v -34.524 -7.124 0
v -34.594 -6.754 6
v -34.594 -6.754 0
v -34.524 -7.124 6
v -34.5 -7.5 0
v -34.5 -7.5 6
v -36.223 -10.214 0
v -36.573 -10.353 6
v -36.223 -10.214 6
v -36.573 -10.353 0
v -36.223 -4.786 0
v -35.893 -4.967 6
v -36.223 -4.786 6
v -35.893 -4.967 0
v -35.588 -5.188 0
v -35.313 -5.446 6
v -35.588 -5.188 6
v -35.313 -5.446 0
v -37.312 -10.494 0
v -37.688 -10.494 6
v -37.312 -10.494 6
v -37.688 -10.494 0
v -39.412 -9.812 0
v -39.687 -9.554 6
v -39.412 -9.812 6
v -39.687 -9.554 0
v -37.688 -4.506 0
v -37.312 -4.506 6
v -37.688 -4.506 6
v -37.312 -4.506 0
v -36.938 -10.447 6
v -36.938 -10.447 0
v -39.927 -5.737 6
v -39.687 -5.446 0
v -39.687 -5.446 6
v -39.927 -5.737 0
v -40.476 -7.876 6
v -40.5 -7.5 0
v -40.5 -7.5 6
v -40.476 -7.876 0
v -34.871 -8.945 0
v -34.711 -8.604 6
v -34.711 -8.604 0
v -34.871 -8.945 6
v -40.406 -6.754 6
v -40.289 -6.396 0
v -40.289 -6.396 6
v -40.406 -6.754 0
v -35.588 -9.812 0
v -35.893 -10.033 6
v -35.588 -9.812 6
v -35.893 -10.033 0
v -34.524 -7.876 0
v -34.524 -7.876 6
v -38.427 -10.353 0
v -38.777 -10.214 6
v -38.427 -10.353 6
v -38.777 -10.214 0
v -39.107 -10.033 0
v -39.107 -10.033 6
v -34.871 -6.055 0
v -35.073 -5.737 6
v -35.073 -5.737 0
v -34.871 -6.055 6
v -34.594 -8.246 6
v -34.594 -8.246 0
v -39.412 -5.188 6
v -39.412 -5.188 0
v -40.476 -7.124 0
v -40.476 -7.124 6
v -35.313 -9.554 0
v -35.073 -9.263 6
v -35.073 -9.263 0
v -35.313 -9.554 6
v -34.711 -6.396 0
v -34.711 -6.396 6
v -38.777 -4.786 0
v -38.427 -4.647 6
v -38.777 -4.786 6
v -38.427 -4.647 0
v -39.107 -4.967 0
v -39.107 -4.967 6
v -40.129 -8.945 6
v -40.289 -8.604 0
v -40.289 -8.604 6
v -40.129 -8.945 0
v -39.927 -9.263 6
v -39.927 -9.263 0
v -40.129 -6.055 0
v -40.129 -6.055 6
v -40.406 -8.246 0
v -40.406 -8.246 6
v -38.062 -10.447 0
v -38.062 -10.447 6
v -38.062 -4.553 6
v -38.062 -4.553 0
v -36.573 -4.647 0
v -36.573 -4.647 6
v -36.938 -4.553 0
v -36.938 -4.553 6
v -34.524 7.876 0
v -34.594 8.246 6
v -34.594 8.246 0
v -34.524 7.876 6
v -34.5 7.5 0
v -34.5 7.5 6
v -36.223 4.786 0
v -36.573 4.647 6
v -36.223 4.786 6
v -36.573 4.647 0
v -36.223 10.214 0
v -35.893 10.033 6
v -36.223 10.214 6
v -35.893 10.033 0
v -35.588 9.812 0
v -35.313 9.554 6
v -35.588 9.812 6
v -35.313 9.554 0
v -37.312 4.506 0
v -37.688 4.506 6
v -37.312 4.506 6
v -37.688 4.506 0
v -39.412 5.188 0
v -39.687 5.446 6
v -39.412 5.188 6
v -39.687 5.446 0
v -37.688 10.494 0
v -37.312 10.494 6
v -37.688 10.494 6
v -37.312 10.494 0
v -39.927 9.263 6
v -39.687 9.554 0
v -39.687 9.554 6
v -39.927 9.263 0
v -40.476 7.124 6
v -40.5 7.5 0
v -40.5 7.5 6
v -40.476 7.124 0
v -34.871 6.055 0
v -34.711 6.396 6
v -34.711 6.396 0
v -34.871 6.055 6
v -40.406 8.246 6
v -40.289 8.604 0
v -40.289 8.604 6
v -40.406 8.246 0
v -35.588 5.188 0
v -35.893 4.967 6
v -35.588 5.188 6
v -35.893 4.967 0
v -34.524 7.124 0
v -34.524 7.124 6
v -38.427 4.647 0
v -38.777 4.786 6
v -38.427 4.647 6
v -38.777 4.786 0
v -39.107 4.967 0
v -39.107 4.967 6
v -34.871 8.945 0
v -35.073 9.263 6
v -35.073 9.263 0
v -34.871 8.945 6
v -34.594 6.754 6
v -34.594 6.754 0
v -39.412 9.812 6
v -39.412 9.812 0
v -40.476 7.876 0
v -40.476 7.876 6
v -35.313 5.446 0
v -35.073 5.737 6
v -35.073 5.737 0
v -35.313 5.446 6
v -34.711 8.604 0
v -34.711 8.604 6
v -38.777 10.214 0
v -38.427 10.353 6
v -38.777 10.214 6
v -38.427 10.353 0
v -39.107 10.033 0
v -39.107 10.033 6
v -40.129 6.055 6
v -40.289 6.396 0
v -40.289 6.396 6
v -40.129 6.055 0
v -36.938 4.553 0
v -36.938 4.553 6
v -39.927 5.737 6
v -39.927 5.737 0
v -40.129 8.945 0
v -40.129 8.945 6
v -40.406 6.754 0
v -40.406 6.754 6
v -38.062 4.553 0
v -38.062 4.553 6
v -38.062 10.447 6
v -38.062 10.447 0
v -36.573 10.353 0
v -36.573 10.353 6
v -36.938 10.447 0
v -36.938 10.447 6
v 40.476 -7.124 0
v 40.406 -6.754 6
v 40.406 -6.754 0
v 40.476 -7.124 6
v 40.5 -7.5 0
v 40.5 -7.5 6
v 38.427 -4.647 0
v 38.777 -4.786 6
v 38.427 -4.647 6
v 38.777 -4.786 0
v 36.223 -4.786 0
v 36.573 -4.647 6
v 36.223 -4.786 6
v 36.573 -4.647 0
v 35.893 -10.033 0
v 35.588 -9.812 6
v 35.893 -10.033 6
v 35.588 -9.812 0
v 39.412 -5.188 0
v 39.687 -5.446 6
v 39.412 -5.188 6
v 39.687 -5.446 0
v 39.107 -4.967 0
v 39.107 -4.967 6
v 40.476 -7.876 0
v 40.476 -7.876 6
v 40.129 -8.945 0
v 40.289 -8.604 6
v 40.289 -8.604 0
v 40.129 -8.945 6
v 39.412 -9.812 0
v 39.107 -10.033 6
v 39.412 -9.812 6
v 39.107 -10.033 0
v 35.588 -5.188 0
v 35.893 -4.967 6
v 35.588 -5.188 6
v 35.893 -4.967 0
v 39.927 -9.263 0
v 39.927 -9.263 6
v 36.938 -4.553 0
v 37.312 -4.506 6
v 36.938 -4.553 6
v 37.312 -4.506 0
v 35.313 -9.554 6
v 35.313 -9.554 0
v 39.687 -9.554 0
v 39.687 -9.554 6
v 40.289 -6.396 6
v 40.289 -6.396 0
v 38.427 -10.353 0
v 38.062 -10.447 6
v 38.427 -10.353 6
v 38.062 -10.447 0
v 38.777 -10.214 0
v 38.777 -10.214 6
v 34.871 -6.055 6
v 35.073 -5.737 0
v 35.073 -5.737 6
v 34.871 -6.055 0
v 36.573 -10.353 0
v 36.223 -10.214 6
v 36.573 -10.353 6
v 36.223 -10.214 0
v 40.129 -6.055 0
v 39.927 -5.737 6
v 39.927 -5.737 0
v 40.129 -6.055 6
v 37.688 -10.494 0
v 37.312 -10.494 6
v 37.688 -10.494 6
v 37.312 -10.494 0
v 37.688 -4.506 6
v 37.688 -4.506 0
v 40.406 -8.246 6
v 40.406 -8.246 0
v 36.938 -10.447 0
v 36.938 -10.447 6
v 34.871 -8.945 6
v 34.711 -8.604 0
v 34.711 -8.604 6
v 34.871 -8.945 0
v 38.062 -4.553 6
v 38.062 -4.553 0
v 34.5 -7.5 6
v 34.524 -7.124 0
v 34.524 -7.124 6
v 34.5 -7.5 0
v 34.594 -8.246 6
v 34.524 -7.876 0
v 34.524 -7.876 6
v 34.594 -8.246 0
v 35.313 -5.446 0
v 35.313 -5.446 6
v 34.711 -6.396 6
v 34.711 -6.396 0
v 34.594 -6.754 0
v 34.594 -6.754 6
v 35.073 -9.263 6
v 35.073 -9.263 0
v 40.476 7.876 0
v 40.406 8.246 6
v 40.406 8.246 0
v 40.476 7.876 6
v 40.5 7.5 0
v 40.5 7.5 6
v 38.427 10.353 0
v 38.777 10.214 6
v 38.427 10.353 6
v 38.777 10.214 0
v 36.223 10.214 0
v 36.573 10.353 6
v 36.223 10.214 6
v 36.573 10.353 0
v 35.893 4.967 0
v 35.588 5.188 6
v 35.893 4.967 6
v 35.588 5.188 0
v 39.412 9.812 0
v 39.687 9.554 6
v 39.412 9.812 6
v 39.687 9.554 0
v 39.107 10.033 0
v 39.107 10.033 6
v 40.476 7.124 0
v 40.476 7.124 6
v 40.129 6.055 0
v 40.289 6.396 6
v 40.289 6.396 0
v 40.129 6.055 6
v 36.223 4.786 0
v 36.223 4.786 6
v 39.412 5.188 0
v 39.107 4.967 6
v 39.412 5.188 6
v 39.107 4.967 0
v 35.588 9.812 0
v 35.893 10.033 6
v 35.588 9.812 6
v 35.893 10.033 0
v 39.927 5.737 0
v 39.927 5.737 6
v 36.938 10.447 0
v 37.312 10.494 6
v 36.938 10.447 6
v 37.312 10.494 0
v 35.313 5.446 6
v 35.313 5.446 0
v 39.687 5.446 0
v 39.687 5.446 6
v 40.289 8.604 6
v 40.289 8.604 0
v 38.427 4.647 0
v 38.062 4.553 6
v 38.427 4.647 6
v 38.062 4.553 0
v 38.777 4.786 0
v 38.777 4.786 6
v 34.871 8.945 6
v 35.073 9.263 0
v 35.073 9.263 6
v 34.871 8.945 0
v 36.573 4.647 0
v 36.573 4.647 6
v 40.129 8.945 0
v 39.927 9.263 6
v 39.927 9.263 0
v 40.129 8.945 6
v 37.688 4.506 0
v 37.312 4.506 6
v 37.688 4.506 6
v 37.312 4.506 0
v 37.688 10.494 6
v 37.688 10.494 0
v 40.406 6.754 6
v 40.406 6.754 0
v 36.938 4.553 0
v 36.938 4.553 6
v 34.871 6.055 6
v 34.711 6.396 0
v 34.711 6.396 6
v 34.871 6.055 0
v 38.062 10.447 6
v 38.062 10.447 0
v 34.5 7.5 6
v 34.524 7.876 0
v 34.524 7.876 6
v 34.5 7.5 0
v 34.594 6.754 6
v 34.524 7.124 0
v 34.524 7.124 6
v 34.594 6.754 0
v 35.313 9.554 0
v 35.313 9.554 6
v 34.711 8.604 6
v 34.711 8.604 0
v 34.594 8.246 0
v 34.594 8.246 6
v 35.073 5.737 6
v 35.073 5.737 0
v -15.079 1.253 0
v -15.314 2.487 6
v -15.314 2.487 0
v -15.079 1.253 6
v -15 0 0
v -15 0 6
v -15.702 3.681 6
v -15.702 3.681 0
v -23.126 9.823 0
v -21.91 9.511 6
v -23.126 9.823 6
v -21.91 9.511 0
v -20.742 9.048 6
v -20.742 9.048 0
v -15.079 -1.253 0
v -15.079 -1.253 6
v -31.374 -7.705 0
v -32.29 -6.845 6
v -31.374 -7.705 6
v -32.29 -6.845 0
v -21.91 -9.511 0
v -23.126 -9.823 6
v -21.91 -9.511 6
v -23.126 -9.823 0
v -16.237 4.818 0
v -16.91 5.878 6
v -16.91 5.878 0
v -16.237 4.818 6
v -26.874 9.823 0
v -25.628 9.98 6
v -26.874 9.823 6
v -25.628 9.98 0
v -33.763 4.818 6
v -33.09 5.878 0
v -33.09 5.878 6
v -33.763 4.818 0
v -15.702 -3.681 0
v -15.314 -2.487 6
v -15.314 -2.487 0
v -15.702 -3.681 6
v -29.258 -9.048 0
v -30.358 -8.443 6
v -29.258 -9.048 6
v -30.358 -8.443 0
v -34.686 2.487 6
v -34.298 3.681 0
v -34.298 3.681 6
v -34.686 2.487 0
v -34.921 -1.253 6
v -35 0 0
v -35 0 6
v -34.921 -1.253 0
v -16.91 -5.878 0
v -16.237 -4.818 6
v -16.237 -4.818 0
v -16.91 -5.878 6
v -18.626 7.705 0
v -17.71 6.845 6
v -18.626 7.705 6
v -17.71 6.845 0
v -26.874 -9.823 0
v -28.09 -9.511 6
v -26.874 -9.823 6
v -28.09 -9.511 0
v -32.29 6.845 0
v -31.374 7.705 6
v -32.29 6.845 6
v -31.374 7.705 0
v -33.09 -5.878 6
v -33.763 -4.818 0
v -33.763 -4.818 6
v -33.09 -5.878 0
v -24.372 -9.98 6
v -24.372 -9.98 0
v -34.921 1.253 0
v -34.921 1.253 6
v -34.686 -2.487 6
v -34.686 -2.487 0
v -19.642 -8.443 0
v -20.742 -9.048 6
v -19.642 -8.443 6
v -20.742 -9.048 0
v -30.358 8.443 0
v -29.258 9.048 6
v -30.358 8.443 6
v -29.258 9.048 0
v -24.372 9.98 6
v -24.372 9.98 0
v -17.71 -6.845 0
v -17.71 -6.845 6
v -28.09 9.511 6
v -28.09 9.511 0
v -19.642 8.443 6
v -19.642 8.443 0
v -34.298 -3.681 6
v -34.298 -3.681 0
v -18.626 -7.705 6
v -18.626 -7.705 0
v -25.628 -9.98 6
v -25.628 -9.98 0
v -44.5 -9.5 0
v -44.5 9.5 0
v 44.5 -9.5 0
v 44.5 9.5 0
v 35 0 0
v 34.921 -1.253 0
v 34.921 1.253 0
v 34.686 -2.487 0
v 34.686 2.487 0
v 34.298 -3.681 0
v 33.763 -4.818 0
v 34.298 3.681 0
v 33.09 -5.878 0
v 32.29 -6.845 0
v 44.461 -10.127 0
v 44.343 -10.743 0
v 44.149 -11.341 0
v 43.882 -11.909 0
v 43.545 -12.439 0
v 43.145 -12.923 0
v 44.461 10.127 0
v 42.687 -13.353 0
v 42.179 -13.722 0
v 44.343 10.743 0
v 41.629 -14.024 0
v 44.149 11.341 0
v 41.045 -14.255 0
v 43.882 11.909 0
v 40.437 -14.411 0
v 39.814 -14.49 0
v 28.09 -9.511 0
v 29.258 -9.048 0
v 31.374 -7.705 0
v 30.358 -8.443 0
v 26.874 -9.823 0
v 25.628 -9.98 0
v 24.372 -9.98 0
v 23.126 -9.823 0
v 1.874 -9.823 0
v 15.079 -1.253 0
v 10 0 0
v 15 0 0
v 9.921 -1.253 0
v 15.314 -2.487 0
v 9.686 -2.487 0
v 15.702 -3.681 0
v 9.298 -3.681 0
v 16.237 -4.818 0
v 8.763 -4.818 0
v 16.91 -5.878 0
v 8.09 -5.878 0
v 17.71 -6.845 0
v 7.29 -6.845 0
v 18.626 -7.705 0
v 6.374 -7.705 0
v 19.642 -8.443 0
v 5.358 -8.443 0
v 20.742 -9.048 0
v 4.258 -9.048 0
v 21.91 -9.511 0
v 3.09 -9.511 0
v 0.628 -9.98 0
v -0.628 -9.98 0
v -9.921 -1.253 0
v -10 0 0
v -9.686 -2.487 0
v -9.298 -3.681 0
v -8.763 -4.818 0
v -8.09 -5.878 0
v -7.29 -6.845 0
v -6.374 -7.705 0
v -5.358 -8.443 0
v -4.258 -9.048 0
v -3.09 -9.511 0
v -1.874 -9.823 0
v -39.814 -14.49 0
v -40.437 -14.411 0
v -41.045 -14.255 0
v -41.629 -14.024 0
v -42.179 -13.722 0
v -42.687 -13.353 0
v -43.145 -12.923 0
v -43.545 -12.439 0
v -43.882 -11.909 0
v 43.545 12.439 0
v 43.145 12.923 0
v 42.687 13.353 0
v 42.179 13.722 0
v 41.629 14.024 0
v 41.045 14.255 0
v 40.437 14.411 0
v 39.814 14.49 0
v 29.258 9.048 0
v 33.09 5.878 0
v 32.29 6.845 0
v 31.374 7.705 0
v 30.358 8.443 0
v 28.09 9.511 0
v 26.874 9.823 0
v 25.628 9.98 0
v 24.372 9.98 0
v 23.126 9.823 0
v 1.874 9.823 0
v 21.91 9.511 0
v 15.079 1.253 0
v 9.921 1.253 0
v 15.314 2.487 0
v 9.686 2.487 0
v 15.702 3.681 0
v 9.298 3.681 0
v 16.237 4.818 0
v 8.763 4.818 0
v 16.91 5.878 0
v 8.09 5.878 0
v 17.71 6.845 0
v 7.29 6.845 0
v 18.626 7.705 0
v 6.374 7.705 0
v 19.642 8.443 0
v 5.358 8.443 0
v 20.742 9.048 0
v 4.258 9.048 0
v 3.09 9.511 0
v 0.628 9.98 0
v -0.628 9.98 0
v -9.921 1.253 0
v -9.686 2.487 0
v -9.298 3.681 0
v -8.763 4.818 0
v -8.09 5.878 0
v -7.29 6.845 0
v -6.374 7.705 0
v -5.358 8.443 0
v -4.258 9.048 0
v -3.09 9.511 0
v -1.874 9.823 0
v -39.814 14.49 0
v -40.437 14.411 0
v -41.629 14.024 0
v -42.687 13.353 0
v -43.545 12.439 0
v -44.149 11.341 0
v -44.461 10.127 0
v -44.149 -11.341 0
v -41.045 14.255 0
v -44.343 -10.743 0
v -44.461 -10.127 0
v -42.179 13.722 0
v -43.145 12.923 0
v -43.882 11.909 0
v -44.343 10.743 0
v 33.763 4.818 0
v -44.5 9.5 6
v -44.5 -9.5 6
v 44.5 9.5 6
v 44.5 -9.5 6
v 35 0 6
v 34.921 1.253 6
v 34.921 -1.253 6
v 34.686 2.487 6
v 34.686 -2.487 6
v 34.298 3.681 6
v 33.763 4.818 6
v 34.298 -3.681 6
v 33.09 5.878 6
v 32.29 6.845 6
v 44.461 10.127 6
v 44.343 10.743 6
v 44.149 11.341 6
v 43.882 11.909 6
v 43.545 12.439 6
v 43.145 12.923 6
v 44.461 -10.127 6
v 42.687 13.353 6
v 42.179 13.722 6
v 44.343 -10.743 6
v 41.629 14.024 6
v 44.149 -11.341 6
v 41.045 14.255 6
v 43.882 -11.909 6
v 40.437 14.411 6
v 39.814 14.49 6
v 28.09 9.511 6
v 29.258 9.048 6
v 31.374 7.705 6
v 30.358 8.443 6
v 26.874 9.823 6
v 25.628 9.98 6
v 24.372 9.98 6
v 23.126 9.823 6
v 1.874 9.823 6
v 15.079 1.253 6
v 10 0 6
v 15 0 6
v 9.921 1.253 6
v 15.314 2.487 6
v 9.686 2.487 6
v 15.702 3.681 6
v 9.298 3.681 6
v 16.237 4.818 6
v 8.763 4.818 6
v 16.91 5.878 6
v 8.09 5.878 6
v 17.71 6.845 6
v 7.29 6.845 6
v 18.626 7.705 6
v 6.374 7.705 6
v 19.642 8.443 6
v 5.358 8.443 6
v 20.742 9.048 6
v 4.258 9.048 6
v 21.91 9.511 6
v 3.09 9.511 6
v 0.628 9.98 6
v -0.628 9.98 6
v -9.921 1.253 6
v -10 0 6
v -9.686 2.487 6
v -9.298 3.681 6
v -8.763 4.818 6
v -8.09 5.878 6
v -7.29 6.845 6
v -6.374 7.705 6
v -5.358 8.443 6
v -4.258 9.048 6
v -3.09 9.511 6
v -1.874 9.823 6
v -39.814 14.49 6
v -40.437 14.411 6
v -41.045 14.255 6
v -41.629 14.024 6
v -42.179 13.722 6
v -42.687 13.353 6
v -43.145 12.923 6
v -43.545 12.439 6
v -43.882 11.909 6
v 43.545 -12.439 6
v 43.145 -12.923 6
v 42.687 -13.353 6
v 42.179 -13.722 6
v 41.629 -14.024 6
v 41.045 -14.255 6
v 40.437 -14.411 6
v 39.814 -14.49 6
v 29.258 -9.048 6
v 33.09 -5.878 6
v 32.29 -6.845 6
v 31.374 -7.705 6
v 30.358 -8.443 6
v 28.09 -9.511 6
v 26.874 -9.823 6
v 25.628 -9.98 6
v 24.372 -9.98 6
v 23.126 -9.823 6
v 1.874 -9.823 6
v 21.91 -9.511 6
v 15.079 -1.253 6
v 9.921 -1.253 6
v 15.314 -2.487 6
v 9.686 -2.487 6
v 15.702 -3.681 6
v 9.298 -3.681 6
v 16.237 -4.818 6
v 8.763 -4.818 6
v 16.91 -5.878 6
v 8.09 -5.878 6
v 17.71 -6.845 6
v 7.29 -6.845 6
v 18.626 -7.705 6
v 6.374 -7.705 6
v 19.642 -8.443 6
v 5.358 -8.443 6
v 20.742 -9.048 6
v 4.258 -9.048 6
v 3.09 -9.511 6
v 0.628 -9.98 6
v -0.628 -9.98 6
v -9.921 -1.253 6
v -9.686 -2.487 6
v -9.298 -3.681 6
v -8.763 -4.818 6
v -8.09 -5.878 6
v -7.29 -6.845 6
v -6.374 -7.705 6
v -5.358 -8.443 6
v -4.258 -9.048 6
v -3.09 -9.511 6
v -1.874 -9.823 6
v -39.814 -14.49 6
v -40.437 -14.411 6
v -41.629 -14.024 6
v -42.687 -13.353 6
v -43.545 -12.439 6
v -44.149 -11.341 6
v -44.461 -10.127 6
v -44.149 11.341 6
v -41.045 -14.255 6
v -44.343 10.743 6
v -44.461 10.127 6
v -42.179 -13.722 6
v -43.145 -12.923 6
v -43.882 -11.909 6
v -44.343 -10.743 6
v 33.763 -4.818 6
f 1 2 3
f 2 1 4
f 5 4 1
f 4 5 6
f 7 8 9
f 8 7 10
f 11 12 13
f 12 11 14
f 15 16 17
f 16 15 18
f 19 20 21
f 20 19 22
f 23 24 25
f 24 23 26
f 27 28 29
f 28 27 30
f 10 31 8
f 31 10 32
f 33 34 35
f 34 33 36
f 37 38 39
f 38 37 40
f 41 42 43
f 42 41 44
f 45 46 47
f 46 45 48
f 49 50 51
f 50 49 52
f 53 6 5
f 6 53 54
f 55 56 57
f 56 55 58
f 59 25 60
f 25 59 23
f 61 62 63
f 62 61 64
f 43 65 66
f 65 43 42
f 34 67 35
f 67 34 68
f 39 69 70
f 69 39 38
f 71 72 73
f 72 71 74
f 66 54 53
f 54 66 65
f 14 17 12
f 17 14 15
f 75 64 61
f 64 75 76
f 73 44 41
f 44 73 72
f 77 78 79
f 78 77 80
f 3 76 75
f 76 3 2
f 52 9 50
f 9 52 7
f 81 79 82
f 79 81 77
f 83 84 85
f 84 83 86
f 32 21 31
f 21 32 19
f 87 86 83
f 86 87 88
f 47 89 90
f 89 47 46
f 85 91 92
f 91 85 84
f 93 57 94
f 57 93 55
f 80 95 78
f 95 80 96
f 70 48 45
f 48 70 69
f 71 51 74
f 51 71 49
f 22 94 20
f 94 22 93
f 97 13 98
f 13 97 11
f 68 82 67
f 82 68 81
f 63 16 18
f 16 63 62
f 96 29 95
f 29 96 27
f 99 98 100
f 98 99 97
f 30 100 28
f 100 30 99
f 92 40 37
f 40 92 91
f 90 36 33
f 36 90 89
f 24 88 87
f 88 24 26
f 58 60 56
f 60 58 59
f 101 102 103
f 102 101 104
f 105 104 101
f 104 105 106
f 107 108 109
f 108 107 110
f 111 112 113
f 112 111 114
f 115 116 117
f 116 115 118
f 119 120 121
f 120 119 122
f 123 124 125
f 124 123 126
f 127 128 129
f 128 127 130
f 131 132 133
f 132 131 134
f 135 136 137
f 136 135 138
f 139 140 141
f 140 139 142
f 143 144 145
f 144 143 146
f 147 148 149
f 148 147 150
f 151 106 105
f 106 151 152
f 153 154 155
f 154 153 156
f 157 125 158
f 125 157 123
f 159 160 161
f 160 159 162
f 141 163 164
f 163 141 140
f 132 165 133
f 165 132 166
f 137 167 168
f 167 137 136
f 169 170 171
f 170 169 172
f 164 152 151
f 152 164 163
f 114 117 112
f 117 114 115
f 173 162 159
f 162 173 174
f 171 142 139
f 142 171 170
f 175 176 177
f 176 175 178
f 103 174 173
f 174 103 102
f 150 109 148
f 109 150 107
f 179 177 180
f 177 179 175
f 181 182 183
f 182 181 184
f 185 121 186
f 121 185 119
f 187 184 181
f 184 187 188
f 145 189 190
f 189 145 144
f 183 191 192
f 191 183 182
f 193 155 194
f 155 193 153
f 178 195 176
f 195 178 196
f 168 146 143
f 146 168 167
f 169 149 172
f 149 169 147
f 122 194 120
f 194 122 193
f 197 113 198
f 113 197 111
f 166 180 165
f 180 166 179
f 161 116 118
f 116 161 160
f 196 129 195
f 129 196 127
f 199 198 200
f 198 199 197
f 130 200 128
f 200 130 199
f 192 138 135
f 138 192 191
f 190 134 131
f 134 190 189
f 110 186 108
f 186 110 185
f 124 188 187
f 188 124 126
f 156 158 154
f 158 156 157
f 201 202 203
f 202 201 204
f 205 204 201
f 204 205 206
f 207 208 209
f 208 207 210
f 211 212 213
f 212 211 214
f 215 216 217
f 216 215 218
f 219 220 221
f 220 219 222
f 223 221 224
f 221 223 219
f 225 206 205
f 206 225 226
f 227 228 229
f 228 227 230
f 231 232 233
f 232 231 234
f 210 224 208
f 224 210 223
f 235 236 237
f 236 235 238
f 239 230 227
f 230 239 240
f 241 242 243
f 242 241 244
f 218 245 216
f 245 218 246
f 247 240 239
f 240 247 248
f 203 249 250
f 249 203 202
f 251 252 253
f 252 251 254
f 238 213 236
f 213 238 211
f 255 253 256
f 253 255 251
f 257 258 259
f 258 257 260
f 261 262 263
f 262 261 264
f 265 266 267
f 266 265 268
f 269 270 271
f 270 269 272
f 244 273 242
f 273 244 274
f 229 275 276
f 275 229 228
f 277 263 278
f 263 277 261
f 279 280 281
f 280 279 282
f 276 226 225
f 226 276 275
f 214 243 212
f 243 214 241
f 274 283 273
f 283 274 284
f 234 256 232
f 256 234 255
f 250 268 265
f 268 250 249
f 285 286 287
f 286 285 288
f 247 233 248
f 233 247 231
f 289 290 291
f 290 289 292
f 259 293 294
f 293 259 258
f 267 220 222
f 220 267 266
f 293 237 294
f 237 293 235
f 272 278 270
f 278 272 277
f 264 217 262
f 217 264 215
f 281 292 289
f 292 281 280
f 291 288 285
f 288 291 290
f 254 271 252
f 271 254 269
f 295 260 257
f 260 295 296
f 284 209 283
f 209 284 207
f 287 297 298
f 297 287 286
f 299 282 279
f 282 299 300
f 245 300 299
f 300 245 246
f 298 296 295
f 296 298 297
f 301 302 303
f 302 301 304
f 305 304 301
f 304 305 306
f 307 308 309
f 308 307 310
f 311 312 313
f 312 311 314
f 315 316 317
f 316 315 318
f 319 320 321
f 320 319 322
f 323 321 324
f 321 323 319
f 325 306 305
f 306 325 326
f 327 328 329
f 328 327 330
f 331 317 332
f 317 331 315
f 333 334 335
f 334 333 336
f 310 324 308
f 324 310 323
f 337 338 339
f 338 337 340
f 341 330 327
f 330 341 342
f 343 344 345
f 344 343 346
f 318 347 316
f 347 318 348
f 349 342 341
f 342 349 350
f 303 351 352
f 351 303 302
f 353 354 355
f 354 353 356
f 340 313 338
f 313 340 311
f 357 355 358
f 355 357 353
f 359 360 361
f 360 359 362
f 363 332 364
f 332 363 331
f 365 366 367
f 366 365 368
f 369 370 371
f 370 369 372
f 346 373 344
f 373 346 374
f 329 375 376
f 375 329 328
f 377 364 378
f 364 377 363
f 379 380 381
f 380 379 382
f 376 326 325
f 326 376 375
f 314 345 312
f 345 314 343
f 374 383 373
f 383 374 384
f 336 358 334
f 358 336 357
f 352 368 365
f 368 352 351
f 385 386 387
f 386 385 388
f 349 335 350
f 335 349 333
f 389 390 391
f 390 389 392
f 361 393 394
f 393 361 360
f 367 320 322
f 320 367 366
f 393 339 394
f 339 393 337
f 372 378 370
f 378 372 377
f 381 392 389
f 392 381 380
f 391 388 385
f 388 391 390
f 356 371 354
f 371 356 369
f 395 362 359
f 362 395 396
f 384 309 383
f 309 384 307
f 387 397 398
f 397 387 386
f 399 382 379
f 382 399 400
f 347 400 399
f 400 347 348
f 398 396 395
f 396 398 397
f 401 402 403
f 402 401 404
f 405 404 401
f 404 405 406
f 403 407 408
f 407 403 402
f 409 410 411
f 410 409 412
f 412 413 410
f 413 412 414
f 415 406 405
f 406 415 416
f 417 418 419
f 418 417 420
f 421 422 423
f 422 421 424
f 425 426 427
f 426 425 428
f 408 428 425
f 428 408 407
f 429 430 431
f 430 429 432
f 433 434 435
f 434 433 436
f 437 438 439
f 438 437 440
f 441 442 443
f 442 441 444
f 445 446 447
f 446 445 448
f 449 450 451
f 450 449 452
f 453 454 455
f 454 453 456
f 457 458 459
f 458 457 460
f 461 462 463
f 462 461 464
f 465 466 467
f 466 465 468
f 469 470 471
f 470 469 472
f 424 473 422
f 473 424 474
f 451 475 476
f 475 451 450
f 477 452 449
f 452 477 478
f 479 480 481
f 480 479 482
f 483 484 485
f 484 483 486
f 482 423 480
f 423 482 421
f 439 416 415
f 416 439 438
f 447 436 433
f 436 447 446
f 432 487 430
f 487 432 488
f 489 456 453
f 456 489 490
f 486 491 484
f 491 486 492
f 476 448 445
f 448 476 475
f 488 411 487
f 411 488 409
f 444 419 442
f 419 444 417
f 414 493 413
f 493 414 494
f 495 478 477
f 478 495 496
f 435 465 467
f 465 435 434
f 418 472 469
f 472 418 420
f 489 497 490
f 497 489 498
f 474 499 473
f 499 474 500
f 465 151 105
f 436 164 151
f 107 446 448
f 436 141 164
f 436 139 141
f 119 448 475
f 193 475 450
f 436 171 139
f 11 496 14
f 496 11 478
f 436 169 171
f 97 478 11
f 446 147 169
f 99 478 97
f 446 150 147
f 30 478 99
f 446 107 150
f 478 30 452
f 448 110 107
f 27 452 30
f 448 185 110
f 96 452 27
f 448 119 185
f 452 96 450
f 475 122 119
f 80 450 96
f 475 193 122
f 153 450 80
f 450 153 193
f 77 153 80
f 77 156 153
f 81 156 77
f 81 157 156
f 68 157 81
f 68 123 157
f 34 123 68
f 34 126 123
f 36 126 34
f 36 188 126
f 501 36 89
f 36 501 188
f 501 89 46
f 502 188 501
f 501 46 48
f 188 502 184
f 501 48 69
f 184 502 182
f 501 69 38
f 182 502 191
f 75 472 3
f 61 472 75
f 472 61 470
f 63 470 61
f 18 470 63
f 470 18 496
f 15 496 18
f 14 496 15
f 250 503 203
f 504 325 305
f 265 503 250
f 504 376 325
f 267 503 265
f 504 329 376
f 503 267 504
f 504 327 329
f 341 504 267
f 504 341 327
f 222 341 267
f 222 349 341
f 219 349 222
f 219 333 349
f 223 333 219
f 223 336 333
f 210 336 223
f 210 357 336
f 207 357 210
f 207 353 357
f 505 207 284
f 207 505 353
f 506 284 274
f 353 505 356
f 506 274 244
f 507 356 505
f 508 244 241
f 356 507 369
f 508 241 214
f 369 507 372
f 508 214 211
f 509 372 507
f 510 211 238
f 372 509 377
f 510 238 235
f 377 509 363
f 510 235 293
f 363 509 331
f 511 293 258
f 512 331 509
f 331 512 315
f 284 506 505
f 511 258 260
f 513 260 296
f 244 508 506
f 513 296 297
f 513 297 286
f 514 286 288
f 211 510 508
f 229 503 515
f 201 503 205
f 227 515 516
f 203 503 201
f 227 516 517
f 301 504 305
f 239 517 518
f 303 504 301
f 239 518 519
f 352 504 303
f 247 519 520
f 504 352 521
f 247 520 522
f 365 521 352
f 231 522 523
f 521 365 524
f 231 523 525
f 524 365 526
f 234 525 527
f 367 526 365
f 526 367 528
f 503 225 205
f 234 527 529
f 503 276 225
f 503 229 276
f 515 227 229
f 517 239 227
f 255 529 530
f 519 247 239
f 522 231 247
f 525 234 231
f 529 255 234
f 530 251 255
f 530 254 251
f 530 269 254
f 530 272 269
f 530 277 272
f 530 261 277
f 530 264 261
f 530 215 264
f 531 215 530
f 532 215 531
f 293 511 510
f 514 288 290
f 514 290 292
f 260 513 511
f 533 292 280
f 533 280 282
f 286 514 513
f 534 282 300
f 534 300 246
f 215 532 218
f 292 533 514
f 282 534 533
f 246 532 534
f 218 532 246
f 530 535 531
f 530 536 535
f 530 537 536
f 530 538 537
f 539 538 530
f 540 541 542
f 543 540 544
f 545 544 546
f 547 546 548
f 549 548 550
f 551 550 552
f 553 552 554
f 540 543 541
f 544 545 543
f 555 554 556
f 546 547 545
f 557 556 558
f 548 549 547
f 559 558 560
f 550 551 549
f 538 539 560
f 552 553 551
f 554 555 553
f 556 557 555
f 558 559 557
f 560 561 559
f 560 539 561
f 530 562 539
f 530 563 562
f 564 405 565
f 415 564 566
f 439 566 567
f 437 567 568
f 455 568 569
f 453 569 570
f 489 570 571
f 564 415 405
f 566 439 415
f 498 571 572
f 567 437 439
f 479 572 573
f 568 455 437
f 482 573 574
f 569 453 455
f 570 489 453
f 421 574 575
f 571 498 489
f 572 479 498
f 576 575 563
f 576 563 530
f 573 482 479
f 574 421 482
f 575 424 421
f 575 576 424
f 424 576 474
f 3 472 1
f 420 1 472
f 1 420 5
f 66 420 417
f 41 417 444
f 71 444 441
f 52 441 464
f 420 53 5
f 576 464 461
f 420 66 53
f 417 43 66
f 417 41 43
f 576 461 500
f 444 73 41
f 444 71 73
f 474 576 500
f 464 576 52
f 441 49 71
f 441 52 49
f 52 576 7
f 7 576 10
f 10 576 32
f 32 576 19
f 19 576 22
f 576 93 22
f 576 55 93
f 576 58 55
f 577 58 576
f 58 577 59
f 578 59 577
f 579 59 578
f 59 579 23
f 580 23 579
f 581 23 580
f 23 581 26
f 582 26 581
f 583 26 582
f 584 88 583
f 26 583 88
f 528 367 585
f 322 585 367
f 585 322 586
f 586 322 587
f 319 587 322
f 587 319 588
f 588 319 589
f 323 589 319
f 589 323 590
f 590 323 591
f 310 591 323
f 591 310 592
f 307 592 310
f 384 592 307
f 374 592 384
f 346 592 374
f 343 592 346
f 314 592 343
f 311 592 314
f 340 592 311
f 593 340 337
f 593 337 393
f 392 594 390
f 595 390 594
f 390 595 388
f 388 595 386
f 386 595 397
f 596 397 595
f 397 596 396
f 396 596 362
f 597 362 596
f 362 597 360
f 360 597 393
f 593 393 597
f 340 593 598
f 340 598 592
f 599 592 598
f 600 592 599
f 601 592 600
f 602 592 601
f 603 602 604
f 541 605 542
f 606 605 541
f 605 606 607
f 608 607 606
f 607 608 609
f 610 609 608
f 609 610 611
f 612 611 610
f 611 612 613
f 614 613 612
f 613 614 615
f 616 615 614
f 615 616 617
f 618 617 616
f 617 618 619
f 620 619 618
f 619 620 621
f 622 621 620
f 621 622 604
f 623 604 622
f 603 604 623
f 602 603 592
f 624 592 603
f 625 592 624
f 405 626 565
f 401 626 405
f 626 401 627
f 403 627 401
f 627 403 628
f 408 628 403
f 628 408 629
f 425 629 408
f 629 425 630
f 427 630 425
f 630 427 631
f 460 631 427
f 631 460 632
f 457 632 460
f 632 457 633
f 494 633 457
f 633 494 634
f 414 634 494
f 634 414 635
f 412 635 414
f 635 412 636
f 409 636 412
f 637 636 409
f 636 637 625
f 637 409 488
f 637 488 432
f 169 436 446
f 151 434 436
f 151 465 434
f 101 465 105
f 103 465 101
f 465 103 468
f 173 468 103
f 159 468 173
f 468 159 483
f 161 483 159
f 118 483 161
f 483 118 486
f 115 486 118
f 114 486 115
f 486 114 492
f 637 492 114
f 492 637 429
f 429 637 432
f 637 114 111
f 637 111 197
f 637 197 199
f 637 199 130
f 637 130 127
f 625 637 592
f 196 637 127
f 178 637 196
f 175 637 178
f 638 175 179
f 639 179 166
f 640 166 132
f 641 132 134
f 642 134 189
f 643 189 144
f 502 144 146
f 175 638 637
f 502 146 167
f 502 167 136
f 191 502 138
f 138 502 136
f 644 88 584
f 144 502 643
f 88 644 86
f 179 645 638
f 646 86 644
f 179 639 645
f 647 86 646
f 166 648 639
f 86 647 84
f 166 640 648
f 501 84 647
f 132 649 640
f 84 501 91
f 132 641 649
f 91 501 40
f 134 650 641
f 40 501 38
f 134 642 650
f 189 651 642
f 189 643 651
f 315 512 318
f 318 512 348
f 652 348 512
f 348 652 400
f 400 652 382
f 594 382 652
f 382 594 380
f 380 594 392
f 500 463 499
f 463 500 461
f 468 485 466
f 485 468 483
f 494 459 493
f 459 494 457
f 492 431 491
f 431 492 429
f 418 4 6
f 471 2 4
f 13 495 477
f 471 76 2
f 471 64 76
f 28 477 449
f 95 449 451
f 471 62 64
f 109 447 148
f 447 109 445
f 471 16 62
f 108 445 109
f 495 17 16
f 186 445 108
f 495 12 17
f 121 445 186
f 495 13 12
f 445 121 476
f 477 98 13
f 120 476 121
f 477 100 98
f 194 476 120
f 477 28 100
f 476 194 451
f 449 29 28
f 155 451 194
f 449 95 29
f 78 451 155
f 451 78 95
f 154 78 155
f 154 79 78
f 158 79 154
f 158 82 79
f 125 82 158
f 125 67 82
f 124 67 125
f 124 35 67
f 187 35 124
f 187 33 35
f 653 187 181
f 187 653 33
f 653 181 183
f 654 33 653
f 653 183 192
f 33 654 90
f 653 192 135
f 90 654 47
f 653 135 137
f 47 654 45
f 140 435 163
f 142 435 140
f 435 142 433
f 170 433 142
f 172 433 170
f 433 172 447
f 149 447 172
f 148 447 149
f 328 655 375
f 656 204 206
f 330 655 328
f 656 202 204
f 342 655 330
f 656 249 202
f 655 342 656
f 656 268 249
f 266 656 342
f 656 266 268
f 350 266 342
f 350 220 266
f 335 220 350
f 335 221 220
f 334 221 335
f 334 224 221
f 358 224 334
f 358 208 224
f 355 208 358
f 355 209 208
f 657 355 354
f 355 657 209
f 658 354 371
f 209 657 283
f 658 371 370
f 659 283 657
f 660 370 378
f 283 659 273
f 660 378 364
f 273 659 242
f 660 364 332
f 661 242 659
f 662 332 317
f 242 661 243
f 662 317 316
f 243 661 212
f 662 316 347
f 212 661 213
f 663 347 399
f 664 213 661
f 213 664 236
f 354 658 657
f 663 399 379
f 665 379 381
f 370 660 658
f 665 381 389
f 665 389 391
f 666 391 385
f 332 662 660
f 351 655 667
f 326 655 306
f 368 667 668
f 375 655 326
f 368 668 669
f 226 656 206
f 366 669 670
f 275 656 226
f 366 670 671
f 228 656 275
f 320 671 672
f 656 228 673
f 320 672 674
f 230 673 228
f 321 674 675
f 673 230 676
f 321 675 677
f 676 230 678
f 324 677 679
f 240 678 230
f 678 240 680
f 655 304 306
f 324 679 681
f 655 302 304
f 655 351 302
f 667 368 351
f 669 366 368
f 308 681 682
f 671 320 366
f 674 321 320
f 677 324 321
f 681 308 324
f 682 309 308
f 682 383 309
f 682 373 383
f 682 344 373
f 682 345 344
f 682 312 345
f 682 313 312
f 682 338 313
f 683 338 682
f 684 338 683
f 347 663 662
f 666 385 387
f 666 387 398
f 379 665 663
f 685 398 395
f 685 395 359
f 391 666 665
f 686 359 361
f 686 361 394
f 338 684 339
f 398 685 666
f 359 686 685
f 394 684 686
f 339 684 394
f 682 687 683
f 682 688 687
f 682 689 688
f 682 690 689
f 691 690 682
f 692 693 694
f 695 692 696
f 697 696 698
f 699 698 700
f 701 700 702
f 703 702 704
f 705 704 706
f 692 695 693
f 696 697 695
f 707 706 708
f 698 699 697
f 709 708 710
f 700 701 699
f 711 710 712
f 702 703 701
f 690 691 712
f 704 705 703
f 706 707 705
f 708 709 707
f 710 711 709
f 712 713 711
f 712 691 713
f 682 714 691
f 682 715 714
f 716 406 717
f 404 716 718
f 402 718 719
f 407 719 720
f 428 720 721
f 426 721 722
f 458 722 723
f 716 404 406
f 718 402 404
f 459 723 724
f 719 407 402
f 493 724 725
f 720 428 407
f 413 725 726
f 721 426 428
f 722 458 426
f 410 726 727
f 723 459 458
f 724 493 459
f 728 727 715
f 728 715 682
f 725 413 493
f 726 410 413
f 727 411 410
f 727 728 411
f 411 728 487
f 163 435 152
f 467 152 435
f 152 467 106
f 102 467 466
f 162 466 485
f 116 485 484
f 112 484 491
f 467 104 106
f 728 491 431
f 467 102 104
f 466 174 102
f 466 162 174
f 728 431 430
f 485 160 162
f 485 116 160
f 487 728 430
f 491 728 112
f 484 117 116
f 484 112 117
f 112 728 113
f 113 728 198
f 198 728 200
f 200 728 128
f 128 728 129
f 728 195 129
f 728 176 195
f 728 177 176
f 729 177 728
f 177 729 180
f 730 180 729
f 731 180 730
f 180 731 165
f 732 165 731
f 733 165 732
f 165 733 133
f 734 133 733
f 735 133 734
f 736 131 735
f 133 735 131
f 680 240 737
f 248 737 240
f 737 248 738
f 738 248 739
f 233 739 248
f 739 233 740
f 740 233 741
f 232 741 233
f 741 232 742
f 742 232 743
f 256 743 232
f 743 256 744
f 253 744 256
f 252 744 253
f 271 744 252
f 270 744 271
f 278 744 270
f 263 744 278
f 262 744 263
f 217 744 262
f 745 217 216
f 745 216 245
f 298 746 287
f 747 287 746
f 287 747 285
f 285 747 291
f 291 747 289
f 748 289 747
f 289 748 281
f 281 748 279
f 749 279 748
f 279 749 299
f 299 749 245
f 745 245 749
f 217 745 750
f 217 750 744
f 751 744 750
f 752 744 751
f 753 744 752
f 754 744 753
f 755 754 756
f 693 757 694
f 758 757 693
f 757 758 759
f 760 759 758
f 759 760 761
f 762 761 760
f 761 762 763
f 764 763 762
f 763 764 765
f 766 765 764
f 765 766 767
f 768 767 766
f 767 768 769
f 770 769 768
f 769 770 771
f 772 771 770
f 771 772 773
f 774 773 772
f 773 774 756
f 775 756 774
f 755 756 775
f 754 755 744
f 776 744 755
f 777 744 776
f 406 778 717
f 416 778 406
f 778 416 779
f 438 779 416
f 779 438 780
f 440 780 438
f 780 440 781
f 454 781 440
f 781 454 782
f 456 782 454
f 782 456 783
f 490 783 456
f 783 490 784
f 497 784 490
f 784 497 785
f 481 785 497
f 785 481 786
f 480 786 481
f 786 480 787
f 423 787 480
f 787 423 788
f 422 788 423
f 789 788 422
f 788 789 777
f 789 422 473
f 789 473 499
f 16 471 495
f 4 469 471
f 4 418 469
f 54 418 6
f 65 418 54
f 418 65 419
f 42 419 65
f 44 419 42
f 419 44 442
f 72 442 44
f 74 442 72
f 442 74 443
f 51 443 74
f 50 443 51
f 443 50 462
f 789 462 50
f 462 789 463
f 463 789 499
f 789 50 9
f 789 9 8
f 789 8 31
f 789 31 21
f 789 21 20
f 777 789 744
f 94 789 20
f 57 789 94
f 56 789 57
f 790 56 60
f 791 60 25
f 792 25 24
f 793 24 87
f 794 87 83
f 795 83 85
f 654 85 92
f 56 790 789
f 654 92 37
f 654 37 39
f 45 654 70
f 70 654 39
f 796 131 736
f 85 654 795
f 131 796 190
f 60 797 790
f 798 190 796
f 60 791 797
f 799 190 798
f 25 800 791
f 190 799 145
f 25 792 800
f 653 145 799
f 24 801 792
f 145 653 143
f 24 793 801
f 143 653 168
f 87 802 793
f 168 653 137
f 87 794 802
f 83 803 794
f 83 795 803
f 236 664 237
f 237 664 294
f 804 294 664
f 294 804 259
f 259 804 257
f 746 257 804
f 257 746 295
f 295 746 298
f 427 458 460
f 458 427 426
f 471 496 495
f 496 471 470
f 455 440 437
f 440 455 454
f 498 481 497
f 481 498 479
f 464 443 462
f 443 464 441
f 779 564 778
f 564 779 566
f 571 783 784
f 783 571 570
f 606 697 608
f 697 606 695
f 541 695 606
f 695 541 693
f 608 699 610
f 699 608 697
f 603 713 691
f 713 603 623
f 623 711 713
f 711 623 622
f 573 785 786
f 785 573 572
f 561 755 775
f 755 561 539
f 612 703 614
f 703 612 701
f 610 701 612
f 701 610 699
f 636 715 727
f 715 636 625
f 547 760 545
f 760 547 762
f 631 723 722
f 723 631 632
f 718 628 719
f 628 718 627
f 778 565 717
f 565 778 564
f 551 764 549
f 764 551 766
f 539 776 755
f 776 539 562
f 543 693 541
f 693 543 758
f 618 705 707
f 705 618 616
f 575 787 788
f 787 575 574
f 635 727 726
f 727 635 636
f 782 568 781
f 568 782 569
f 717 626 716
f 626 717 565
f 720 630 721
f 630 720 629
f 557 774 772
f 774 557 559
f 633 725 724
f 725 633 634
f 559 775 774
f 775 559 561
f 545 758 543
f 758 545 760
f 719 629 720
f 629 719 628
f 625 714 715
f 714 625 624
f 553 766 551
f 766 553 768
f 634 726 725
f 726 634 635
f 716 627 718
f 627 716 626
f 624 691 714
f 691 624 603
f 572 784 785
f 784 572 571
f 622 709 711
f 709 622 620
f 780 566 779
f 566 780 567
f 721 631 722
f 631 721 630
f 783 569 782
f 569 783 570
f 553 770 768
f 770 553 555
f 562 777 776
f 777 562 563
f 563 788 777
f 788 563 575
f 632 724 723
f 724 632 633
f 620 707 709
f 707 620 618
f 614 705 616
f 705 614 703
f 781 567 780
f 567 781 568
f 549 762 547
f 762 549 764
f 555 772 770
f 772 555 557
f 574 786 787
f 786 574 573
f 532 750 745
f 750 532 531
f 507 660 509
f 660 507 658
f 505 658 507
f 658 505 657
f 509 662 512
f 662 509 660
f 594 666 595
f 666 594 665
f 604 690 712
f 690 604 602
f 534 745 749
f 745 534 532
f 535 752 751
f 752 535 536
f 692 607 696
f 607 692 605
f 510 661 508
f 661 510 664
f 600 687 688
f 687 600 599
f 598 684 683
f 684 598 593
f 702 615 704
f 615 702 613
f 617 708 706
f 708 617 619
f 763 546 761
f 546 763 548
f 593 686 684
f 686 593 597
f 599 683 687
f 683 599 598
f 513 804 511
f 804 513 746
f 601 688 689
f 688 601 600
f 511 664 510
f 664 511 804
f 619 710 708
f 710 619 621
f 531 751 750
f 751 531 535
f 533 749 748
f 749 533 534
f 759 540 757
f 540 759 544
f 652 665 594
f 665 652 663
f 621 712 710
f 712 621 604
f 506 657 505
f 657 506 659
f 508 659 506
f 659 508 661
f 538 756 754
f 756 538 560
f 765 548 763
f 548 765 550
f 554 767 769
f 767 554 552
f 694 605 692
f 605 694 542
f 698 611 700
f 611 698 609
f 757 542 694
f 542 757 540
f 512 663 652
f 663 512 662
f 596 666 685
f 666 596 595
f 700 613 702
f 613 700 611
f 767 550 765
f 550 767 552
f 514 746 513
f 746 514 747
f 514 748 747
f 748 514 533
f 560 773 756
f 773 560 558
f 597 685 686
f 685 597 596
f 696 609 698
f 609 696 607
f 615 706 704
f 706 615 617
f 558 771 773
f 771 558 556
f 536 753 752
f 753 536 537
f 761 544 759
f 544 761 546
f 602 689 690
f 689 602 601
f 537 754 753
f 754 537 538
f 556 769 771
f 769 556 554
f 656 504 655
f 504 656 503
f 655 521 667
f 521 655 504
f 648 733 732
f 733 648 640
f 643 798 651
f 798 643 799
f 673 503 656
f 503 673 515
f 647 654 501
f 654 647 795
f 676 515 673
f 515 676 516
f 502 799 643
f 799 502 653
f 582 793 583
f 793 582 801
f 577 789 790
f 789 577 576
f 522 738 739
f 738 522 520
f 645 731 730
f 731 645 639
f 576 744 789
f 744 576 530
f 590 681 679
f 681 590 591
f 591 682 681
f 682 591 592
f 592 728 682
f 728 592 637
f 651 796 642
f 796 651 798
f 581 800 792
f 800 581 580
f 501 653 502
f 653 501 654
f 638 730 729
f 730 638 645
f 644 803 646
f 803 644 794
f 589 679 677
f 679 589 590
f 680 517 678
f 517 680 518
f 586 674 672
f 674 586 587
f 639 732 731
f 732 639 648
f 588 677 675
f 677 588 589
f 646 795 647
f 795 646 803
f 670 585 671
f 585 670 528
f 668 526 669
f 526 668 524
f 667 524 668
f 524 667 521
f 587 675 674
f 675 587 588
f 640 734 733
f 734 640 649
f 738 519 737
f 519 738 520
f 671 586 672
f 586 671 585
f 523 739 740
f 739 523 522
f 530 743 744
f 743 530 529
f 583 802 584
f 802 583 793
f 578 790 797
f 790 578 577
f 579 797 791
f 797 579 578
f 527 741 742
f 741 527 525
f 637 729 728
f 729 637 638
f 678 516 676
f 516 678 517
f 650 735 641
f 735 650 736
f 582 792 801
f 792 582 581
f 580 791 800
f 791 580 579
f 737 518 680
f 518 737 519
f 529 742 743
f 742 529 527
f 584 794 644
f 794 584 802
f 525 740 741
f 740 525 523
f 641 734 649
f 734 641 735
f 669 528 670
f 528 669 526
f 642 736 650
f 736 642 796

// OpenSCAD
$fn = 50;


difference() {
	union() {
		hull() {
			translate(v = [-39.5000000000, 9.5000000000, 0]) {
				cylinder(h = 6, r = 5);
			}
			translate(v = [39.5000000000, 9.5000000000, 0]) {
				cylinder(h = 6, r = 5);
			}
			translate(v = [-39.5000000000, -9.5000000000, 0]) {
				cylinder(h = 6, r = 5);
			}
			translate(v = [39.5000000000, -9.5000000000, 0]) {
				cylinder(h = 6, r = 5);
			}
		}
	}
	union() {
		#translate(v = [-37.5000000000, -7.5000000000, -100.0000000000]) {
			cylinder(h = 200, r = 3.0000000000);
		}
		#translate(v = [-37.5000000000, 7.5000000000, -100.0000000000]) {
			cylinder(h = 200, r = 3.0000000000);
		}
		#translate(v = [37.5000000000, -7.5000000000, -100.0000000000]) {
			cylinder(h = 200, r = 3.0000000000);
		}
		#translate(v = [37.5000000000, 7.5000000000, -100.0000000000]) {
			cylinder(h = 200, r = 3.0000000000);
		}
		#translate(v = [-25.0000000000, 0, 0]) {
			cylinder(h = 6, r = 10.0000000000);
		}
		#cylinder(h = 6, r = 10.0000000000);
		#translate(v = [25.0000000000, 0, 0]) {
			cylinder(h = 6, r = 10.0000000000);
		}
	}
}
